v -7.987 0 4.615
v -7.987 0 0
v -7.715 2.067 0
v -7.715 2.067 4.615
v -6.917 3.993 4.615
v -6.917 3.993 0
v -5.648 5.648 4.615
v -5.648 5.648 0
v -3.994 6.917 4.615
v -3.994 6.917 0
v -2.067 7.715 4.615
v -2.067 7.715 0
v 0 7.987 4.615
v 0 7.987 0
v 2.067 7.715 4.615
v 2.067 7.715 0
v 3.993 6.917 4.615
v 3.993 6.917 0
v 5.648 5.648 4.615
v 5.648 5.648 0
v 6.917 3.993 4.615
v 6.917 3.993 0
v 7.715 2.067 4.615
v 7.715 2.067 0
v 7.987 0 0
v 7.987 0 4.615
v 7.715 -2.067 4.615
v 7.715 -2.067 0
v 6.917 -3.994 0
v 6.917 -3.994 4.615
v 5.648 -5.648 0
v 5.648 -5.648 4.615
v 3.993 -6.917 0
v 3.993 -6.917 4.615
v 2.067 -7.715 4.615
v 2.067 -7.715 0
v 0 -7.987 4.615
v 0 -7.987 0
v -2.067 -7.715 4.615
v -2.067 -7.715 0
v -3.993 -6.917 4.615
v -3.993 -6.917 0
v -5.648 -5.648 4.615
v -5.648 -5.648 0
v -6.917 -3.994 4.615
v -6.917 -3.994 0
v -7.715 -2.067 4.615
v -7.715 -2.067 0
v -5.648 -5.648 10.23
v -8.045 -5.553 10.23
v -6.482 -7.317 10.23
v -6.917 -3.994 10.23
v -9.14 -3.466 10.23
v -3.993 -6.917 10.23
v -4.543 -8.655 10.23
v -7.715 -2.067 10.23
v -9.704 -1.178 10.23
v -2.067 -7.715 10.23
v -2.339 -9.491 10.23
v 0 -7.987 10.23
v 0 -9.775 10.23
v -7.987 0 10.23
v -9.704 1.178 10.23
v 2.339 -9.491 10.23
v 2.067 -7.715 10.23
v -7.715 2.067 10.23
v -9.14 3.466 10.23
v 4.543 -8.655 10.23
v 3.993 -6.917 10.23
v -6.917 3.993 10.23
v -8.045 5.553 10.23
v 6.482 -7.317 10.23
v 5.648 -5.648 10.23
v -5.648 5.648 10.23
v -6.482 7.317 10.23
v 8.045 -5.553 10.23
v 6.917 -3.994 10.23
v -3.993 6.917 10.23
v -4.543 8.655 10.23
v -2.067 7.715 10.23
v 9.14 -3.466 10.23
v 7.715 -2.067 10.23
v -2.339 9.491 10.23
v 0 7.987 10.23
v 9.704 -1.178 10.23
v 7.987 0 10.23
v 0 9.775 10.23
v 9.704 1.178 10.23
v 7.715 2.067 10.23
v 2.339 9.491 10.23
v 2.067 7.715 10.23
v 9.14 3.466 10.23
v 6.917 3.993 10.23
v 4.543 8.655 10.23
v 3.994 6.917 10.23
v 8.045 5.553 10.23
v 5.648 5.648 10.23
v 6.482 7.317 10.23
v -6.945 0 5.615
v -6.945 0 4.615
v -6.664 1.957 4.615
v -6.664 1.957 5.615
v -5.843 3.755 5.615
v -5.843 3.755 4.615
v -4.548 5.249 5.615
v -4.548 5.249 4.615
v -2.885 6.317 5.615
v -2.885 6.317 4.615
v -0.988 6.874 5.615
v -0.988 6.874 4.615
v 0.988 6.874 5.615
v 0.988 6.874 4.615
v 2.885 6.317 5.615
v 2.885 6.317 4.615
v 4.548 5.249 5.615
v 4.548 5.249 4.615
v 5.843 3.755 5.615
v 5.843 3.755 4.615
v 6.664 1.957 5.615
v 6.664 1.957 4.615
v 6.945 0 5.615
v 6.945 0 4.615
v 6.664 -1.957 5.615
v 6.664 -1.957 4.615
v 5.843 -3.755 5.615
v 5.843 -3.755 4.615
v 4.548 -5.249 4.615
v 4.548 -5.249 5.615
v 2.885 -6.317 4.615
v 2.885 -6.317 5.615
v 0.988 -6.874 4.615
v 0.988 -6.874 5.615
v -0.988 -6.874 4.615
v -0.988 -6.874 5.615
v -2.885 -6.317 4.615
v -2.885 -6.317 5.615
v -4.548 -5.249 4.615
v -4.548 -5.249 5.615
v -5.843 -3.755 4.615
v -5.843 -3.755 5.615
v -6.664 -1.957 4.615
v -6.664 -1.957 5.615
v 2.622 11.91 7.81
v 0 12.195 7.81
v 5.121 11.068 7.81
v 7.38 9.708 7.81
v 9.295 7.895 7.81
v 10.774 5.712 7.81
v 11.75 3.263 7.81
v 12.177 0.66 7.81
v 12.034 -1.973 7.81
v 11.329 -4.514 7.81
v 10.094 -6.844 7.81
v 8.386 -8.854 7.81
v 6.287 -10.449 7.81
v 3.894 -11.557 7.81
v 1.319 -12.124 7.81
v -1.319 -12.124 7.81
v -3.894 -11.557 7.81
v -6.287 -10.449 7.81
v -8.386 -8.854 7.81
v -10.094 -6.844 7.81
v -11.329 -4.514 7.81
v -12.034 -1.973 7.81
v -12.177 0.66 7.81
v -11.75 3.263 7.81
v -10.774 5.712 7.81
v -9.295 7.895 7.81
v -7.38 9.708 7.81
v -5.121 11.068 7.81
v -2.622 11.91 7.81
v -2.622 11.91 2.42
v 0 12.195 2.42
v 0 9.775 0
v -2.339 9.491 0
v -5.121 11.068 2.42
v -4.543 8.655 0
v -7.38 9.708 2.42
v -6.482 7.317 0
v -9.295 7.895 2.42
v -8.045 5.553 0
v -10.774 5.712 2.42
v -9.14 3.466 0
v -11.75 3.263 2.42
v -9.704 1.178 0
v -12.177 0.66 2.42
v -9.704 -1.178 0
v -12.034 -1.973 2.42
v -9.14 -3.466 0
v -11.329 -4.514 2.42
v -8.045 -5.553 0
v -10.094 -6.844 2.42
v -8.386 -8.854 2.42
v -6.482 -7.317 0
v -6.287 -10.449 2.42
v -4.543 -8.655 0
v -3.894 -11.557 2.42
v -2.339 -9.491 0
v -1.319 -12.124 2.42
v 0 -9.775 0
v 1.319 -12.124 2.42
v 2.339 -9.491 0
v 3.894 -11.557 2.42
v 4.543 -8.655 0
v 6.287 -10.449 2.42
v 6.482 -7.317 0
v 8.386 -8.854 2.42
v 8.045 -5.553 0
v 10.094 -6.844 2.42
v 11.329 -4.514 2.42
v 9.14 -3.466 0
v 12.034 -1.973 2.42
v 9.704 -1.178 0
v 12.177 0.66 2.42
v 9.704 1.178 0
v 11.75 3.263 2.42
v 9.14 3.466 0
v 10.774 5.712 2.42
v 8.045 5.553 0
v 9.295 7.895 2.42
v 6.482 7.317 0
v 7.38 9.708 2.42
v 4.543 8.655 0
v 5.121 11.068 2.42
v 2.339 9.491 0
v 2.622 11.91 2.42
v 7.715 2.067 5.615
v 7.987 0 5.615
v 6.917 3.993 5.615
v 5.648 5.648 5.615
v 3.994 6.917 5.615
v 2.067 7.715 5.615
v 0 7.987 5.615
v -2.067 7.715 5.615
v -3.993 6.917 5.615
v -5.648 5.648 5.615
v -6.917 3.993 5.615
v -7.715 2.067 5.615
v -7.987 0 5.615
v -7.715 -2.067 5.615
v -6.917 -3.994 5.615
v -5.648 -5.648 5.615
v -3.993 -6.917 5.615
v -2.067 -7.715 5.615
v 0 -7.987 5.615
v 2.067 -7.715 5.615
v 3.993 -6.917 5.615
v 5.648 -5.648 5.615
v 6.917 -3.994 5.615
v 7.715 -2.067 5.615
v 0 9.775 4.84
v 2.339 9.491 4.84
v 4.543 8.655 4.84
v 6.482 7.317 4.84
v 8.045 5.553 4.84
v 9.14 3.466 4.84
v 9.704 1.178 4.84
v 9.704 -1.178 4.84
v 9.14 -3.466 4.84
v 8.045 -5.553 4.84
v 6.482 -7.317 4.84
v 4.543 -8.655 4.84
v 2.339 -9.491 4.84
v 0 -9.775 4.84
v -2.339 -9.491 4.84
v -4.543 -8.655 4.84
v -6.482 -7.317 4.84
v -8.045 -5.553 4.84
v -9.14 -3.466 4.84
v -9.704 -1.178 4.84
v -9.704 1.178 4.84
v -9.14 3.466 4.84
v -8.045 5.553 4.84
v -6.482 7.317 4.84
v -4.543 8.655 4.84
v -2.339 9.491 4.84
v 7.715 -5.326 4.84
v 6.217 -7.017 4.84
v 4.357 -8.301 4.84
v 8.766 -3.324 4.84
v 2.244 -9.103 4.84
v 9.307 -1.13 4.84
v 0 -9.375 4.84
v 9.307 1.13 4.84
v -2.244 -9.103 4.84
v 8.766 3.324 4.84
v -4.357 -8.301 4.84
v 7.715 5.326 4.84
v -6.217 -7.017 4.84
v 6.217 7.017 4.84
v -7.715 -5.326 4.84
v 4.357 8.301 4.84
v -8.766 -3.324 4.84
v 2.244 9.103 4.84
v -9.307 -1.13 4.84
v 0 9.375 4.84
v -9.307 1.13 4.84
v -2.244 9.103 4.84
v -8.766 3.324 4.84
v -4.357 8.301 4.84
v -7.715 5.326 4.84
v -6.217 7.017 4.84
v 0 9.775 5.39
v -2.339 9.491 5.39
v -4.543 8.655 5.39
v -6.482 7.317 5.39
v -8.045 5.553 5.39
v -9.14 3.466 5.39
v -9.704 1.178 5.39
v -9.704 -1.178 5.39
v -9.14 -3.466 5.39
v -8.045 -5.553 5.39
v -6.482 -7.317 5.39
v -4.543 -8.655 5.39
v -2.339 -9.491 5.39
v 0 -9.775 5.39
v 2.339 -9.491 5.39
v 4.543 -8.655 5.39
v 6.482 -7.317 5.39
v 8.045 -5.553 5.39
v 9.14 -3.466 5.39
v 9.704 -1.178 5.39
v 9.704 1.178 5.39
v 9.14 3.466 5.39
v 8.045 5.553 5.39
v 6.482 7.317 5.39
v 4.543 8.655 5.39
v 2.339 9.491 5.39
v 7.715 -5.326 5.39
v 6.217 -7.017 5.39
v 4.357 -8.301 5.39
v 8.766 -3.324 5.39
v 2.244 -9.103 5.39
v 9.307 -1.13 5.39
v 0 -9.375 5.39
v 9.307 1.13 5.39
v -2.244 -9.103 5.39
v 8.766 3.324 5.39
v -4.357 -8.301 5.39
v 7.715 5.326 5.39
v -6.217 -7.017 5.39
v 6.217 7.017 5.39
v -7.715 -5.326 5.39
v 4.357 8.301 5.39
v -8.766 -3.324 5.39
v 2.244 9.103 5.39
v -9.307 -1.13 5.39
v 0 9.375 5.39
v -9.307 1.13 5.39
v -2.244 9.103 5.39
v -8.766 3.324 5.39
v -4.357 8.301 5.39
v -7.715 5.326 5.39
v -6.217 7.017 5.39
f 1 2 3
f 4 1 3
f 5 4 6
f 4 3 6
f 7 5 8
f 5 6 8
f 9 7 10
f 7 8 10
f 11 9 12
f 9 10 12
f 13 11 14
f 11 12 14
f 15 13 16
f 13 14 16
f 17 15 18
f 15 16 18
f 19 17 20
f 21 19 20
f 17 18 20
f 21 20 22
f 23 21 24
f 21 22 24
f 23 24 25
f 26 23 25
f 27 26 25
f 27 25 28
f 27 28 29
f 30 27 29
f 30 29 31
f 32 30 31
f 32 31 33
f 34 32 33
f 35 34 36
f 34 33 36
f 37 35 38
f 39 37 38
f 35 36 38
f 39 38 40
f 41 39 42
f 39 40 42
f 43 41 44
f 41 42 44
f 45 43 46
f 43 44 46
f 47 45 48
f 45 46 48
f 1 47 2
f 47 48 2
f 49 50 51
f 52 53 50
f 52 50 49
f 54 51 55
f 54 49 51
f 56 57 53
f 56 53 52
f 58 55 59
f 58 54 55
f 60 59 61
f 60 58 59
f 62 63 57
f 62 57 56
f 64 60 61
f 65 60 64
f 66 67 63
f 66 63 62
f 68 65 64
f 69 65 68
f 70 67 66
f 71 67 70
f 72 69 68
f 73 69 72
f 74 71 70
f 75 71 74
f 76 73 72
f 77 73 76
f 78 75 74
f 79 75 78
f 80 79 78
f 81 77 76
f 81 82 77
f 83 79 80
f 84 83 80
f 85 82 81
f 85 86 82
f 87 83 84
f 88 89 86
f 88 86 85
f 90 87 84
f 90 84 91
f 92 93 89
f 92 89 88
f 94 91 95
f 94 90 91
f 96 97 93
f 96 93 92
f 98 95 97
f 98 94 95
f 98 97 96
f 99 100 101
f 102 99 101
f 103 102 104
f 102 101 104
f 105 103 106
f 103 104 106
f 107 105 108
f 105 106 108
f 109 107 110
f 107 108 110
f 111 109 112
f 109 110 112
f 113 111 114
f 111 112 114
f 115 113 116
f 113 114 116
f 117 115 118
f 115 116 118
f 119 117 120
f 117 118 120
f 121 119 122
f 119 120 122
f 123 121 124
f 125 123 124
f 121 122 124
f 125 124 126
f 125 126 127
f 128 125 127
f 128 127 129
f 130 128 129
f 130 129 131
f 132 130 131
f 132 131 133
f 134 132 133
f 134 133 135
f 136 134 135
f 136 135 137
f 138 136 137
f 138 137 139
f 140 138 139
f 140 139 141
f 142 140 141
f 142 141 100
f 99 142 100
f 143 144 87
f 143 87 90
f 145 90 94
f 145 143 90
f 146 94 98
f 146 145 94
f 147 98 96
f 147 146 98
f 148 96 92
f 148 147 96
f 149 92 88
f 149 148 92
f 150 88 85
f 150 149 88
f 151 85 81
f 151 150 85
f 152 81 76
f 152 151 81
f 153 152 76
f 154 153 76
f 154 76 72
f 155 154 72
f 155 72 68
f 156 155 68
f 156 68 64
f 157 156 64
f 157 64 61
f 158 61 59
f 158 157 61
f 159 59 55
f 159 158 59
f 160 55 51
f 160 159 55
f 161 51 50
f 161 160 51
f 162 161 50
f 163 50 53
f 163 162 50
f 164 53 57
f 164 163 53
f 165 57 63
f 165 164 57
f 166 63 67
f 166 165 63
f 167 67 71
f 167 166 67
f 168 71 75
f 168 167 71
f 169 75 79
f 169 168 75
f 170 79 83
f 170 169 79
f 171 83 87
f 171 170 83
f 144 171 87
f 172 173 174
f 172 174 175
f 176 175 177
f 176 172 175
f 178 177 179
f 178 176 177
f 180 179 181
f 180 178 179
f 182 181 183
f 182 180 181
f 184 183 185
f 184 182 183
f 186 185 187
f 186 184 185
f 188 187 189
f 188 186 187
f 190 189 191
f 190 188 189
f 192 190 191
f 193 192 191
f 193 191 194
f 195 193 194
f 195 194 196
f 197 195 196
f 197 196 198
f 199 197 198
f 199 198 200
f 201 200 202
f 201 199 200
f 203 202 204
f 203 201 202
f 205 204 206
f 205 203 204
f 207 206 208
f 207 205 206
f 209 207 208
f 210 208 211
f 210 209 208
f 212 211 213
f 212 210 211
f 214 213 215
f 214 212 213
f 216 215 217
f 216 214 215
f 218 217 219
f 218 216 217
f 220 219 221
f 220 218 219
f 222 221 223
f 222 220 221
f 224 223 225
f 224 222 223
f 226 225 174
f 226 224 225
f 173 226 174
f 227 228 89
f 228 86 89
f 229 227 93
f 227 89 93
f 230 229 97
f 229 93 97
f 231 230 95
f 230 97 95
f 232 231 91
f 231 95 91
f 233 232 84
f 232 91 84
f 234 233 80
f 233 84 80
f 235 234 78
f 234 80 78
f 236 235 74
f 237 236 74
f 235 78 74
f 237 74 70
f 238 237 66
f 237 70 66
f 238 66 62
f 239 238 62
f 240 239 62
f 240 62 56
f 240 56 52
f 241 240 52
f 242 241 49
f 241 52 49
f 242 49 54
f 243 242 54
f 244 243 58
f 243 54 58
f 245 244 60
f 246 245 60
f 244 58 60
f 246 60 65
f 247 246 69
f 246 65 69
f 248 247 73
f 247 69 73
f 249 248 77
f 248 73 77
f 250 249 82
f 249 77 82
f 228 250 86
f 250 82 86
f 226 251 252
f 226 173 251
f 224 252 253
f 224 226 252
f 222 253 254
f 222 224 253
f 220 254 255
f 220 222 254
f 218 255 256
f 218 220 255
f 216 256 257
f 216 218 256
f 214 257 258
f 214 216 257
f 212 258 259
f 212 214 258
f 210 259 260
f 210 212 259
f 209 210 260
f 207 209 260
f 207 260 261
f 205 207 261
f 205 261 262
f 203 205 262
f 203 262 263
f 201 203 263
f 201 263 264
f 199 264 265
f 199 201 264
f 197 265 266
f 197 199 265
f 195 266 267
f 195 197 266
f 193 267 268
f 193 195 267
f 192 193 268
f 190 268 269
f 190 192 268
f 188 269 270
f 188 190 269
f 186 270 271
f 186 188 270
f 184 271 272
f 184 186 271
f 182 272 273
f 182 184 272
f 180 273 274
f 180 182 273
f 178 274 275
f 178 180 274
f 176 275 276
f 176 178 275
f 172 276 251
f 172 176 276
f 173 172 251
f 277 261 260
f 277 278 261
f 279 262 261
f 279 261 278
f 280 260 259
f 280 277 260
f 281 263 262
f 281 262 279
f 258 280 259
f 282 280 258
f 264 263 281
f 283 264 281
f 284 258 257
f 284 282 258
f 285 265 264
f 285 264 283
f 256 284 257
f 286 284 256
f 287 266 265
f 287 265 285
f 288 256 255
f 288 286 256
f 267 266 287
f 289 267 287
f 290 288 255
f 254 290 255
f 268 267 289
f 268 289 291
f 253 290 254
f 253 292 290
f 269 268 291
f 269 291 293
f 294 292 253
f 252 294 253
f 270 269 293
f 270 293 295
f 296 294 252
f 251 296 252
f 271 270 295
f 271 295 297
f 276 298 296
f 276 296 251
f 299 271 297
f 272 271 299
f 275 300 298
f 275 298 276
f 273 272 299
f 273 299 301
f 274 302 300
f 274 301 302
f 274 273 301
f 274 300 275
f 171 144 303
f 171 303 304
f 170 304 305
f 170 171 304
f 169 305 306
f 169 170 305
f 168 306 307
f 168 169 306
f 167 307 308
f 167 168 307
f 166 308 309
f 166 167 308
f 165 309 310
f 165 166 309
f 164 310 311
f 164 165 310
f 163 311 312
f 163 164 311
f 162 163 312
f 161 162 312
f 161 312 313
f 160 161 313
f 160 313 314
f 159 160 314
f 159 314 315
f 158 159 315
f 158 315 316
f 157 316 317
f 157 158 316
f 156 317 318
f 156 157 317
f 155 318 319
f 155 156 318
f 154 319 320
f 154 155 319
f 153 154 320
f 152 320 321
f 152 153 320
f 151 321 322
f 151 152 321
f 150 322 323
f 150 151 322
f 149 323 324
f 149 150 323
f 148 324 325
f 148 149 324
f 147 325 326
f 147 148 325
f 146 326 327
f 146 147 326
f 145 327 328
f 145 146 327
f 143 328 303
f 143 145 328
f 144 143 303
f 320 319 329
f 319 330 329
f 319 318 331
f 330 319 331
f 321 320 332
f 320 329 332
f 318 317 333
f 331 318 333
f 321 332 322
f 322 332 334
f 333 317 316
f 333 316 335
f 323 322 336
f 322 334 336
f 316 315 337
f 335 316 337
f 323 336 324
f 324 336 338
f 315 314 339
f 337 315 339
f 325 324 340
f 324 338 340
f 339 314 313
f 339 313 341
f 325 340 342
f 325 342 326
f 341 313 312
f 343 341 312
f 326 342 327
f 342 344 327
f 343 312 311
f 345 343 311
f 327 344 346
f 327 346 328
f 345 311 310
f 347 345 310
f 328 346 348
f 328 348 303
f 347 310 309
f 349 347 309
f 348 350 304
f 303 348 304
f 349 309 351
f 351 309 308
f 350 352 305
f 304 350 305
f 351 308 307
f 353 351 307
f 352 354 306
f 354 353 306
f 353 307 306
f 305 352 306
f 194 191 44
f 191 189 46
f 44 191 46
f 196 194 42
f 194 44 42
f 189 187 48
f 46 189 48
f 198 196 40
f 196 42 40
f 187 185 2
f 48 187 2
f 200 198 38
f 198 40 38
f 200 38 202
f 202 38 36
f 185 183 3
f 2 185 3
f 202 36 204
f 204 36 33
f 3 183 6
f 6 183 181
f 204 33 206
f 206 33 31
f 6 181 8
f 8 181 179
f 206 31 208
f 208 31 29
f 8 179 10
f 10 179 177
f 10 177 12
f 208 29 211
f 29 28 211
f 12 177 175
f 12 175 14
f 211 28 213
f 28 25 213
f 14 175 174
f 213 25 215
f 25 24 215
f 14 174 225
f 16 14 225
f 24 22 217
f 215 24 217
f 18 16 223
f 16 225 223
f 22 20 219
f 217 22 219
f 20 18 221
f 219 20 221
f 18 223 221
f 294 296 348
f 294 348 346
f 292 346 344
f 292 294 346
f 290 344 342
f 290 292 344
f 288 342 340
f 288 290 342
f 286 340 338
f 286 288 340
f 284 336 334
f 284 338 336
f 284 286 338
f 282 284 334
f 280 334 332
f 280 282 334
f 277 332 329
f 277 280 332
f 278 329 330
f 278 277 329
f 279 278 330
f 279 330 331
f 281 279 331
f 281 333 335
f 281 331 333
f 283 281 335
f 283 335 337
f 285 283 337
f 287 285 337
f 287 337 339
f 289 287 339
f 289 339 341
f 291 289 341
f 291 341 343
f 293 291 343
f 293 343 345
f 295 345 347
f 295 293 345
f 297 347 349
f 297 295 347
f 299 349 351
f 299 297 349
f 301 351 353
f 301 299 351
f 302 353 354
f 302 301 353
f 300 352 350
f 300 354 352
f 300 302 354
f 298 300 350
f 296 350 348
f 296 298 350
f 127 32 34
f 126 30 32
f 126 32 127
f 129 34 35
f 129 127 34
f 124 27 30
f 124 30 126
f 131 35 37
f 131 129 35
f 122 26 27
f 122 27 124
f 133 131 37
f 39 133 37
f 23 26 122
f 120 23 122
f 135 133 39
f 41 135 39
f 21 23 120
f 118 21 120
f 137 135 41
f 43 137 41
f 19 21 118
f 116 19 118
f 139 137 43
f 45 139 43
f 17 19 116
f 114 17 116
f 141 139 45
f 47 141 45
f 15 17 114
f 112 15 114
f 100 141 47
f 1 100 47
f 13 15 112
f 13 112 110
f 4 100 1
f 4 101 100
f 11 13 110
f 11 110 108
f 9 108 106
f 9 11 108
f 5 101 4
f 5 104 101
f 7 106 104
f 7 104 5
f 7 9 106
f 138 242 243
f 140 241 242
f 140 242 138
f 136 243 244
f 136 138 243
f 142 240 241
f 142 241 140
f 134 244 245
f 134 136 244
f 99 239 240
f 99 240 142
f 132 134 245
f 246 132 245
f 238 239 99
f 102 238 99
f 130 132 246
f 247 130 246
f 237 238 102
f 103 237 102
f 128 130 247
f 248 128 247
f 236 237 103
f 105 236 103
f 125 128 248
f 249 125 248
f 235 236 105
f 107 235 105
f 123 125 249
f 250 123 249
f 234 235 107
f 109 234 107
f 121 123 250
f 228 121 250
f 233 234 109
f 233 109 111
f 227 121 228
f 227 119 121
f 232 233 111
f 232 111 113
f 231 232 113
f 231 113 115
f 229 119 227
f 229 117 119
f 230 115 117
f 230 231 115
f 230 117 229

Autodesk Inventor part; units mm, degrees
ref_plane "YZ Plane" through (0, 0, 0) normal (1, 0, 0) x (0, 1, 0)
ref_plane "XZ Plane" through (0, 0, 0) normal (0, 1, 0) x (-1, 0, 0)
ref_plane "XY Plane" through (0, 0, 0) normal (0, 0, 1) x (1, 0, 0)
sketch "Sketch1" plane through (0, 0, 0) normal (0, 0, 1) x (1, 0, 0)
  circle A0 centre (0, 0) radius 12.195
  dimension "d0" = 24.39
extrude "Extrusion1" add sketch "Sketch1" along normal blind 10.23
sketch "Sketch2" plane through (0, 0, 0) normal (1, 0, 0) x (0, 1, 0)
  line L0 (-12.195, 0) -> (-12.195, 10.23) projected
  line L1 (9.375, 5.115) -> (9.375, 5.39)
  line L2 (9.375, 5.39) -> (9.375, 4.84)
  line L3 (9.375, 4.84) -> (9.375, 5.39)
  line L4 (12.195, 7.81) -> (9.775, 5.39)
  line L5 (12.195, 7.81) -> (15.6174, 7.81) construction
  line L6 (12.195, 7.81) -> (9.775, 10.23)
  line L7 (9.775, 4.84) -> (12.195, 2.42)
  line L8 (12.195, 2.42) -> (9.775, 0)
  line L9 (9.775, 4.84) -> (9.375, 4.84)
  line L10 (9.375, 5.39) -> (9.775, 5.39)
  line L11 (12.195, 7.81) -> (9.775, 10.23)
  line L12 (9.775, 10.23) -> (13.6006, 10.23)
  line L13 (13.6006, 10.23) -> (13.6006, 0)
  line L14 (13.6006, 0) -> (9.775, 0)
  line L15 (-12.195, 0) -> (12.195, 0) projected
  line L16 (0, -2.046) -> (0, 12.276) projected
  point P0 (0, 0)
  dimension "d4" = 0.275
  dimension "d5" = 0.55
  dimension "d6" = 135
revolve "Revolution1" cut sketch "Sketch2" angle 360 about axis through (0, 0, -10) along (0, 0, 1)
sketch "Sketch3" plane through (0, 0, 0) normal (0, 0, -1) x (-1, 0, 0)
  circle A0 centre (0, 0) radius 9.775 projected
  circle A1 centre (0, 0) radius 6.945
  dimension "d8" = 13.89
extrude "Extrusion2" cut sketch "Sketch3" against normal blind 30 contours A1
sketch "Sketch4" plane through (0, 0, 0) normal (0, 0, -1) x (-1, 0, 0)
  circle A0 centre (0, 0) radius 7.987
  dimension "d11" = 15.974
extrude "Extrusion3" cut sketch "Sketch4" against normal blind 4.615
sketch "Sketch5" plane through (0, 0, 10.23) normal (0, 0, 1) x (1, 0, 0)
  circle A0 centre (0, 0) radius 7.987
  dimension "d14" = 15.974
extrude "Extrusion4" cut sketch "Sketch5" against normal blind 4.615
properties part number "dELRIN"
